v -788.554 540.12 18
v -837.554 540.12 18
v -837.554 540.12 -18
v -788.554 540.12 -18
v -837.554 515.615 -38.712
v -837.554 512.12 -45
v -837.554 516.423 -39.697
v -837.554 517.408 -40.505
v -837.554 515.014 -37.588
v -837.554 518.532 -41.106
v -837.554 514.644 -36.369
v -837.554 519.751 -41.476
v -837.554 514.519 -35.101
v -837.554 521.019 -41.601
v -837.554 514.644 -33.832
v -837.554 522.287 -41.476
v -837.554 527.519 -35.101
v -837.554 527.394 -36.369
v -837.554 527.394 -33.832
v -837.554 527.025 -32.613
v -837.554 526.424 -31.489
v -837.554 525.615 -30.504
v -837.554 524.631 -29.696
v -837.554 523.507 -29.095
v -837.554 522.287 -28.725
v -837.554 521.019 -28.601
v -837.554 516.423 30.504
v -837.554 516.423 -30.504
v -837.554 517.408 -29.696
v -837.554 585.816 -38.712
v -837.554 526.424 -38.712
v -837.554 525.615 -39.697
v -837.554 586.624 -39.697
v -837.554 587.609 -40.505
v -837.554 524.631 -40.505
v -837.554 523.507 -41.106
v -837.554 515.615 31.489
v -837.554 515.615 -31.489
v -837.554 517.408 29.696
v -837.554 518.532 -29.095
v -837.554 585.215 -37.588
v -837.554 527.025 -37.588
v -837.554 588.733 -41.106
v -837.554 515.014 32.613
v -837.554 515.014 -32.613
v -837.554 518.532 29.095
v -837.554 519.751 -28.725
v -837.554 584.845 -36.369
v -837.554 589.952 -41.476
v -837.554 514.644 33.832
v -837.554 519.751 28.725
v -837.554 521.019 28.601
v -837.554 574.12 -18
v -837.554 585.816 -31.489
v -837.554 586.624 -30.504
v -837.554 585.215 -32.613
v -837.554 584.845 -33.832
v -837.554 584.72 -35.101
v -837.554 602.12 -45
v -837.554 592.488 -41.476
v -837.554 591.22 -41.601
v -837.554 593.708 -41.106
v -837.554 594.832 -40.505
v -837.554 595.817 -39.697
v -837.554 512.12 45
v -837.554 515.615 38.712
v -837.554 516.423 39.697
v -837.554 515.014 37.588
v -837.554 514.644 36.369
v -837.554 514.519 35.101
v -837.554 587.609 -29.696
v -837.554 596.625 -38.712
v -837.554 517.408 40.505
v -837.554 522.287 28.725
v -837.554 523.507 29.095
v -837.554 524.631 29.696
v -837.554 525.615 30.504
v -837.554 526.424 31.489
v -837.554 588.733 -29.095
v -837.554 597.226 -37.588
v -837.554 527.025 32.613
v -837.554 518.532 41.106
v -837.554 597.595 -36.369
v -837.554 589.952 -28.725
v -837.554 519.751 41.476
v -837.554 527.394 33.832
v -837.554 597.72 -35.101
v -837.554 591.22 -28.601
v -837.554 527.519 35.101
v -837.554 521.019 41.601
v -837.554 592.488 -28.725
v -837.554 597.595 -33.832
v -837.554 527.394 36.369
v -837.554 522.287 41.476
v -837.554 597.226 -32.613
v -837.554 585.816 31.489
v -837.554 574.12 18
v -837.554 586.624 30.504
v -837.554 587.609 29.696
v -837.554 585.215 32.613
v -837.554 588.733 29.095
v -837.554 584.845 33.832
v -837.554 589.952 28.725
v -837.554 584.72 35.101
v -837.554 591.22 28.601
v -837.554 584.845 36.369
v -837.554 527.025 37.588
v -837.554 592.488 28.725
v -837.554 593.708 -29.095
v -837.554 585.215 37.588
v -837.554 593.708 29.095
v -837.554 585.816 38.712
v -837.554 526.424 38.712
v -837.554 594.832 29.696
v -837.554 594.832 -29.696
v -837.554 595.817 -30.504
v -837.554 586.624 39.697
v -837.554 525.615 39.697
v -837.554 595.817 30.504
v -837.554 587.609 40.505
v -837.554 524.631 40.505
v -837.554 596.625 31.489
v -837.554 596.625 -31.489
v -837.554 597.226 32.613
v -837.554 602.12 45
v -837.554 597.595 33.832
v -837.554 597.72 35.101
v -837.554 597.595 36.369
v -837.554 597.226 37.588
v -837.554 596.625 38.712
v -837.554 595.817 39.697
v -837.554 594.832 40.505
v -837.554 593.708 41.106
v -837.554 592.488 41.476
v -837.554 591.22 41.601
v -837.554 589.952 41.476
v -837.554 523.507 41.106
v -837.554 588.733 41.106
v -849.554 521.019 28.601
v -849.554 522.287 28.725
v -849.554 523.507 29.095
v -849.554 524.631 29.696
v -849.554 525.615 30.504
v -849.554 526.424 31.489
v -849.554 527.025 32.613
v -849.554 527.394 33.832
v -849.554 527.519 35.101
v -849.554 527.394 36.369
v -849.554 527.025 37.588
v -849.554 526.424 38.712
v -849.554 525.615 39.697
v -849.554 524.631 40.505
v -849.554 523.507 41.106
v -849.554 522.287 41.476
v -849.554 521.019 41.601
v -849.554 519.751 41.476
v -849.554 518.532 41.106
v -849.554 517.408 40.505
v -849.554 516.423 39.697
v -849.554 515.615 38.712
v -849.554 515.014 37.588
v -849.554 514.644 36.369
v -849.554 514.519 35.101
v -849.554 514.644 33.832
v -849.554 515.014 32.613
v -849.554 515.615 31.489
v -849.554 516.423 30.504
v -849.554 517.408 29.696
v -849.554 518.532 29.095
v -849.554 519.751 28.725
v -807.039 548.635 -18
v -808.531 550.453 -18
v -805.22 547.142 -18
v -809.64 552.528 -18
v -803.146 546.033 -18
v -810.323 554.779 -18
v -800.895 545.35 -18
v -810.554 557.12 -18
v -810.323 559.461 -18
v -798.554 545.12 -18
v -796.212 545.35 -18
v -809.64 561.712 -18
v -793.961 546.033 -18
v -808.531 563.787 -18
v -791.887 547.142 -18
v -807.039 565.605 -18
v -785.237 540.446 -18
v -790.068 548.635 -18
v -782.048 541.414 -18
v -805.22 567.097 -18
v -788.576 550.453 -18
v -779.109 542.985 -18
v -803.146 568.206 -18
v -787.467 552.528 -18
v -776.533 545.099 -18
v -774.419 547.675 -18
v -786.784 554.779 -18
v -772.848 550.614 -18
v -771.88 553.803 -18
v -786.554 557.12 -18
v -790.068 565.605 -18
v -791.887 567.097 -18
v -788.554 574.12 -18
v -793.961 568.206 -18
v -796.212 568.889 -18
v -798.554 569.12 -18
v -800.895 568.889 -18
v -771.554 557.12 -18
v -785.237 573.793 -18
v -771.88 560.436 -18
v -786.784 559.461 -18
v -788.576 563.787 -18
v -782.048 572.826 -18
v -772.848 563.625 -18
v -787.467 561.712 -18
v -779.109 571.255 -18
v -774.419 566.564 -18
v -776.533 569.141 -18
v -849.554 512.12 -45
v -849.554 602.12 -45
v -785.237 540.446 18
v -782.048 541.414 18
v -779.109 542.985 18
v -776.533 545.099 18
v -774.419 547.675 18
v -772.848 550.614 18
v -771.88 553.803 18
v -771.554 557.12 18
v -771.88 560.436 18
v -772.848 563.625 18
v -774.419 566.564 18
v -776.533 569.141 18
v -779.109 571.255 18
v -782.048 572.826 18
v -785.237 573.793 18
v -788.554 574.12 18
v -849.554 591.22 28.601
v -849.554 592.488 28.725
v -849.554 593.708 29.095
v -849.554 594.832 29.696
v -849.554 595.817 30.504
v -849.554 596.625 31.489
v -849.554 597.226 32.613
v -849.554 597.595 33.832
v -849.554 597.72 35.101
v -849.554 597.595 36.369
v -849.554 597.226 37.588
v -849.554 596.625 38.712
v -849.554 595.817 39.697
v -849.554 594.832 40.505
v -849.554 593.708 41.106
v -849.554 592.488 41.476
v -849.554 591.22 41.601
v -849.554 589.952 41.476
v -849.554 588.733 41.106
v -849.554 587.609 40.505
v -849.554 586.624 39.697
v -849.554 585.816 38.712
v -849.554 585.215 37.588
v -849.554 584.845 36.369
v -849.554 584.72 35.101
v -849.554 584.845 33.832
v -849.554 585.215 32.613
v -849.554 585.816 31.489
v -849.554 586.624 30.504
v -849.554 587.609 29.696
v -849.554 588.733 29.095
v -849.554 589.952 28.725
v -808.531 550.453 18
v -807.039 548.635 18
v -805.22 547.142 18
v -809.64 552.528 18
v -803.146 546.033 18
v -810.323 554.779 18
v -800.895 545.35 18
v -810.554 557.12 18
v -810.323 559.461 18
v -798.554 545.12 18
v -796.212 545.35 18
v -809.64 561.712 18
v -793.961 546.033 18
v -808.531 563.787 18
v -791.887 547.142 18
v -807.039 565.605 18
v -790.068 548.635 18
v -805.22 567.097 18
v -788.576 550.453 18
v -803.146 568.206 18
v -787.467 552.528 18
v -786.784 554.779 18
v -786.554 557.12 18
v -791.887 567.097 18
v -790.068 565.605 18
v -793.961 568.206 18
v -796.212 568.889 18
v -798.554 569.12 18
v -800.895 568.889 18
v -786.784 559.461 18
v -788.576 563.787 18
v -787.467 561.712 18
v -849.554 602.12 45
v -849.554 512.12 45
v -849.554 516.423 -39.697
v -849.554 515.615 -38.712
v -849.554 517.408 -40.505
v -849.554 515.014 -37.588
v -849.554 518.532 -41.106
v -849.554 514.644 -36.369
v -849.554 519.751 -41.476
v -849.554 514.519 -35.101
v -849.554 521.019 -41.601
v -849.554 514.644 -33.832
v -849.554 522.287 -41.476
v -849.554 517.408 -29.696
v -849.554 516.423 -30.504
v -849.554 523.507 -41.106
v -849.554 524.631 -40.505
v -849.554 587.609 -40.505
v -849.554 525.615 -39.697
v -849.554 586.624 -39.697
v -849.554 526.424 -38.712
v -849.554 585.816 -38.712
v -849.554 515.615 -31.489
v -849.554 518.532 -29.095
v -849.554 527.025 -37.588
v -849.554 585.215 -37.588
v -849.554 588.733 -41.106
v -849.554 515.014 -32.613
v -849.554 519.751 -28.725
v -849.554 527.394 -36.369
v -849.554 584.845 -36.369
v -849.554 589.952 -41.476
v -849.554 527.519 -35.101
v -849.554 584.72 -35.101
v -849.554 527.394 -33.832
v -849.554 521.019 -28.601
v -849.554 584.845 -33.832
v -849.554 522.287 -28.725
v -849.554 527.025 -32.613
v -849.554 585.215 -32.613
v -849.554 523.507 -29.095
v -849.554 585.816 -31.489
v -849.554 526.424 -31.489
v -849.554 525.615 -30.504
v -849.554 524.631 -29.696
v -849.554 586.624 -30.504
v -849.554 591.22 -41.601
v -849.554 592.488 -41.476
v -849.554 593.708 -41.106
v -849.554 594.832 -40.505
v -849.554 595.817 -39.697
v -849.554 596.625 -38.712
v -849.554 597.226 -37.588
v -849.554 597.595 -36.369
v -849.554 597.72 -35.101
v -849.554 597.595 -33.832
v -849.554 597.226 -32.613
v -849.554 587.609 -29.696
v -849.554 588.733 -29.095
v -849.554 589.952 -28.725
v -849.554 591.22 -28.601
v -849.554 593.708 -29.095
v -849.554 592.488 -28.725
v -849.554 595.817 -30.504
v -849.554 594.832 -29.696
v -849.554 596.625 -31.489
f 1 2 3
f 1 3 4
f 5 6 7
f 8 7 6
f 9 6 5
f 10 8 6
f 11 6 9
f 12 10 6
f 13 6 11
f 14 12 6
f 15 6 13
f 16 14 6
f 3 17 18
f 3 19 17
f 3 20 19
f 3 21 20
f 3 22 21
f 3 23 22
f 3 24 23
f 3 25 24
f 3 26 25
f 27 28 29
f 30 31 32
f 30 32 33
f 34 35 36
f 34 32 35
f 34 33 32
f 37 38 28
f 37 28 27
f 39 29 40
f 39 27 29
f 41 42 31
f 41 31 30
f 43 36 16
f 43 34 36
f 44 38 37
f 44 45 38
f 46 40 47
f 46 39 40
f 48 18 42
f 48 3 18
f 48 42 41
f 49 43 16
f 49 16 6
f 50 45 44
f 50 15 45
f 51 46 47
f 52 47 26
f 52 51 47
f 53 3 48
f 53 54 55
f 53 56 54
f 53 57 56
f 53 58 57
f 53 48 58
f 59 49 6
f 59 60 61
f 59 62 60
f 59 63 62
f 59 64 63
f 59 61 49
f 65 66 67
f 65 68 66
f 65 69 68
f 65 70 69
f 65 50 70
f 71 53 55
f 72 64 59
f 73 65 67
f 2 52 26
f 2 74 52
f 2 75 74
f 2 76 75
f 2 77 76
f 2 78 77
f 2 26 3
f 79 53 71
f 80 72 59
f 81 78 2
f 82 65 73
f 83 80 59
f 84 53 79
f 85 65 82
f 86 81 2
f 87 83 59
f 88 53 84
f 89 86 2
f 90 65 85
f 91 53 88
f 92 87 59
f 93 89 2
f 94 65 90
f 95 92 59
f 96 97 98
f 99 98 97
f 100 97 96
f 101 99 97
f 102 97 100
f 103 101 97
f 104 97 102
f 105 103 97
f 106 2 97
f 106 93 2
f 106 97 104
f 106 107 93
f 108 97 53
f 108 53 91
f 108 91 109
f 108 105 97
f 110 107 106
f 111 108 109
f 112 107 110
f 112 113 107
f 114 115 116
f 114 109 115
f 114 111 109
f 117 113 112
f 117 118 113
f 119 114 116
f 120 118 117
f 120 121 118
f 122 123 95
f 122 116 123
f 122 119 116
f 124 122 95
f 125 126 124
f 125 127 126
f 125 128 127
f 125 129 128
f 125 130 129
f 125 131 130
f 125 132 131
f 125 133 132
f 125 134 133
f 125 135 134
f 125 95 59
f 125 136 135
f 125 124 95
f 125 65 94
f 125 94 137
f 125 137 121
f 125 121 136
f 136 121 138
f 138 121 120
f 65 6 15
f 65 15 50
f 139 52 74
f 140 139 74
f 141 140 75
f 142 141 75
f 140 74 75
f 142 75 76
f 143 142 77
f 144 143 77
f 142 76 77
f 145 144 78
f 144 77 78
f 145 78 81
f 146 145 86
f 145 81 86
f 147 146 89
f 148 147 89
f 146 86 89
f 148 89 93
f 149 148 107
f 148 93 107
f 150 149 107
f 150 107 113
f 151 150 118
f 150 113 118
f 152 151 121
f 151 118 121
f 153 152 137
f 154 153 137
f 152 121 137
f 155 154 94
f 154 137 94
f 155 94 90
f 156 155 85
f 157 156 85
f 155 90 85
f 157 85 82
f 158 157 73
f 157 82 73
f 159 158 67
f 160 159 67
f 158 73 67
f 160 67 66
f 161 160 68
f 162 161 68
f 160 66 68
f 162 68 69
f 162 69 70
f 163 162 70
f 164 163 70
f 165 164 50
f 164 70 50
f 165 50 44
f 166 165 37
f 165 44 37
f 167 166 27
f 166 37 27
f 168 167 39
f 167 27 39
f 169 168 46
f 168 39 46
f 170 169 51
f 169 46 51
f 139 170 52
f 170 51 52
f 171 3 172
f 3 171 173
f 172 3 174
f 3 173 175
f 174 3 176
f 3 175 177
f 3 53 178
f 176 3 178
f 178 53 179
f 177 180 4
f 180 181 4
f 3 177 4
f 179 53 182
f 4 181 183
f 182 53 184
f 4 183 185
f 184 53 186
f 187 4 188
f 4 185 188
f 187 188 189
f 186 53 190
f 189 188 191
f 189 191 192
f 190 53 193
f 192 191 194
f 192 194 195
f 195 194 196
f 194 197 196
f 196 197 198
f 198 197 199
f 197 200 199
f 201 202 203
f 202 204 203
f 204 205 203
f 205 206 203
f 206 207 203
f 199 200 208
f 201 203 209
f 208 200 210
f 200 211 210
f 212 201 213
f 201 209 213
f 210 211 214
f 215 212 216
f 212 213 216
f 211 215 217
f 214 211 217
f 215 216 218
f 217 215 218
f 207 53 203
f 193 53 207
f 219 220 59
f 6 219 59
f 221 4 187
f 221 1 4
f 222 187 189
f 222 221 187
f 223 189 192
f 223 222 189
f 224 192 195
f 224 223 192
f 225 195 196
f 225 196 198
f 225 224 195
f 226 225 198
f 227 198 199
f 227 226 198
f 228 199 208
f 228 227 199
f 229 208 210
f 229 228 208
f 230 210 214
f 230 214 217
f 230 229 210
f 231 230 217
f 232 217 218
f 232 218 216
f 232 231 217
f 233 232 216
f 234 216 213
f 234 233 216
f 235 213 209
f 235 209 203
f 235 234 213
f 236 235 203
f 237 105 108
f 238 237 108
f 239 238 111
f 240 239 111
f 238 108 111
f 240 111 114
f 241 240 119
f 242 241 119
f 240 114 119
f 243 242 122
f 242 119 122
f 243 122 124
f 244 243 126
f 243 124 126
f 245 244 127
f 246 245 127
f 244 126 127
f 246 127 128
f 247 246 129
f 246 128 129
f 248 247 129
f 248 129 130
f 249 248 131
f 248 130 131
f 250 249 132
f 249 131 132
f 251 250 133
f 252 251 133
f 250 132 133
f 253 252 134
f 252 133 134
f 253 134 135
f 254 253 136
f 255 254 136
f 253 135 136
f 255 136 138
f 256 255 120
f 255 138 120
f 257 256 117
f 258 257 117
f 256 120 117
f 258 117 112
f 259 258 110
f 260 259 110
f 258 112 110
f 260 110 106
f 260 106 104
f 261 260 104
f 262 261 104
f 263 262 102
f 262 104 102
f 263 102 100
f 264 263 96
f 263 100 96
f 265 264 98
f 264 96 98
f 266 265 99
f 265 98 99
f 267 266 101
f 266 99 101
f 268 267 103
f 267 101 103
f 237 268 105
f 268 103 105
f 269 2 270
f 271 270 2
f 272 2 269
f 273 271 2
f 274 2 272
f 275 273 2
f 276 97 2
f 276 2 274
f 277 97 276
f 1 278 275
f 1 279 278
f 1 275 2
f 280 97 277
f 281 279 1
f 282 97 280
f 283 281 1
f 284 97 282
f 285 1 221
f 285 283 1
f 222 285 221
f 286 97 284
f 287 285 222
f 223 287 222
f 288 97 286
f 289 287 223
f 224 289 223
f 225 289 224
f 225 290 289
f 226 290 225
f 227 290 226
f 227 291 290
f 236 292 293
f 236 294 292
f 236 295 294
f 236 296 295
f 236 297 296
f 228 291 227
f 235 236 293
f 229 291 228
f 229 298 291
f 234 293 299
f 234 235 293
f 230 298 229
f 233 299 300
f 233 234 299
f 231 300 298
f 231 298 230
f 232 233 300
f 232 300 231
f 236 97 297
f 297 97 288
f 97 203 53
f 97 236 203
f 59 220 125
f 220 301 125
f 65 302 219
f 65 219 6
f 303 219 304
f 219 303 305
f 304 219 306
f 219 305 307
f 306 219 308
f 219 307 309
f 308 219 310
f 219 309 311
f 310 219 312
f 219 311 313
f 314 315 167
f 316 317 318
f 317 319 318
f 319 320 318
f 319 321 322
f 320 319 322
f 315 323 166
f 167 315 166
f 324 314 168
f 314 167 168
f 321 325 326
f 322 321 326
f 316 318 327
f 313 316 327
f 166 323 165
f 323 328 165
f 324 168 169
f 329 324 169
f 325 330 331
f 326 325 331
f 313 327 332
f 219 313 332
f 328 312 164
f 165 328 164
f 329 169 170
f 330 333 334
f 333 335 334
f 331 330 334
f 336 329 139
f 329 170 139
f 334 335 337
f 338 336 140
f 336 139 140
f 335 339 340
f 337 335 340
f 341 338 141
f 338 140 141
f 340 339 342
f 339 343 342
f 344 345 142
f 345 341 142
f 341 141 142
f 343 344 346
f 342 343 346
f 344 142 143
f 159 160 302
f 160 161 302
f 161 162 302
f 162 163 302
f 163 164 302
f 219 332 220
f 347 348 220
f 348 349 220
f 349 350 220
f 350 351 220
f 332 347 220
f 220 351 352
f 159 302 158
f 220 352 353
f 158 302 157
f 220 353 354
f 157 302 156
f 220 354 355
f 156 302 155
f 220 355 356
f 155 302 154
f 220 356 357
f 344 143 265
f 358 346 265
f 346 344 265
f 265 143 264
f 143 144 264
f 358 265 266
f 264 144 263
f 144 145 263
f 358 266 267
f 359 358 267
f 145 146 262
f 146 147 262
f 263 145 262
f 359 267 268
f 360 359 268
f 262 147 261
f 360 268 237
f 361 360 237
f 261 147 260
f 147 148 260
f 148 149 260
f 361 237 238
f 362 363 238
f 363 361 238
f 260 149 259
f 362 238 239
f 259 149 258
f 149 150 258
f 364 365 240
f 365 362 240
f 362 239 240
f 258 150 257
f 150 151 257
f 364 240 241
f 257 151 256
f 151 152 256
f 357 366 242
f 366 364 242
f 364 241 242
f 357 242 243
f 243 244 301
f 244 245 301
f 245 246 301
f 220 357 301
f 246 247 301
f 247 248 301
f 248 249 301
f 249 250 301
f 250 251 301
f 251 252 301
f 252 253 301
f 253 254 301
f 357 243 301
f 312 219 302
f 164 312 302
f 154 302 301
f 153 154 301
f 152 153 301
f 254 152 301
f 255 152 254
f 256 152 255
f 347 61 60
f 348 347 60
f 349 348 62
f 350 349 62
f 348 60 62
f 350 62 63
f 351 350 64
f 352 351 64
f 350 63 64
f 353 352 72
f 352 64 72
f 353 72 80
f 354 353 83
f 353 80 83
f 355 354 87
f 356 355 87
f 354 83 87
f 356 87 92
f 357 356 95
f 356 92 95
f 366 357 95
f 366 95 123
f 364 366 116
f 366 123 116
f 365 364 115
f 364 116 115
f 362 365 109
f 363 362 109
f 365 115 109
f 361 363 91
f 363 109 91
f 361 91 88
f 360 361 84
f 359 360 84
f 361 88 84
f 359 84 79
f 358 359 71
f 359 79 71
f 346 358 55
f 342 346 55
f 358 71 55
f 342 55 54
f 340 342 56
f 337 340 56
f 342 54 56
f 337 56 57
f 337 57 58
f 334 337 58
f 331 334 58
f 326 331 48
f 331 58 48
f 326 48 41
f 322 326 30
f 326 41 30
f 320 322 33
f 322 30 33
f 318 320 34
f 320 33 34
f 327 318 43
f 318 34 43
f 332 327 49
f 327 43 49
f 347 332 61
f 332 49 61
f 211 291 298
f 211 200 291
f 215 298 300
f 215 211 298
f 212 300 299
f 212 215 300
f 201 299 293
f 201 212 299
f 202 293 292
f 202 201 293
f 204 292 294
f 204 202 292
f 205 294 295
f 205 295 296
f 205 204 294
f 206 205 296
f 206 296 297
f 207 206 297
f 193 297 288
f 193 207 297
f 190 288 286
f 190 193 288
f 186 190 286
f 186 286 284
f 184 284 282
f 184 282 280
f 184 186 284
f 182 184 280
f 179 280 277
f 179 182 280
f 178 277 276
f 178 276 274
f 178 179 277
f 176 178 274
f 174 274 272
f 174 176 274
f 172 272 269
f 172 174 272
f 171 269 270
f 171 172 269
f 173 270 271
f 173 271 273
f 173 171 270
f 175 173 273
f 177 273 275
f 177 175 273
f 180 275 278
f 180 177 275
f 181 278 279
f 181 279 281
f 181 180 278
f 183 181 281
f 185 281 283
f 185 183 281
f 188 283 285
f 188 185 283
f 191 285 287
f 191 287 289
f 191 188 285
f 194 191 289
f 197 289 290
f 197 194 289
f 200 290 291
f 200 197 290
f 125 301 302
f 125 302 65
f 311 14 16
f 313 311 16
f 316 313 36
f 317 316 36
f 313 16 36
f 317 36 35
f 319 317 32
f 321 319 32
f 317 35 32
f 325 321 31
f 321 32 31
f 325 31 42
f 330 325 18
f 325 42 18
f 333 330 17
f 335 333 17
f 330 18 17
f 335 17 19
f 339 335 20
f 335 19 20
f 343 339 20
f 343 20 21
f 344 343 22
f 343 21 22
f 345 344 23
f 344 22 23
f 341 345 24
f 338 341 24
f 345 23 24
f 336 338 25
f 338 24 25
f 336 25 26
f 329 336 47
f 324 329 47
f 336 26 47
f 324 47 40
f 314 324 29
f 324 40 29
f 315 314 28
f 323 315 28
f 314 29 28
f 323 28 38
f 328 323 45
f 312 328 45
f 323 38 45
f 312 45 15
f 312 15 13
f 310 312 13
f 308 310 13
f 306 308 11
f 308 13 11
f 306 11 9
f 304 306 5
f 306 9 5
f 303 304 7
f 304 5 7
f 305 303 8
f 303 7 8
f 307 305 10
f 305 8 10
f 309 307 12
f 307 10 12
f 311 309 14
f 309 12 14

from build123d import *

# Parameters (mm, degrees)
DODANIE_WYCI_GNI_CIE3_DEPTH      = 18
DODANIE_WYCI_GNI_CIE3_DEPTH_BACK = 18
SZKIC1_R                         = 12
DODANIE_WYCI_GNI_CIE4_DEPTH      = 45
DODANIE_WYCI_GNI_CIE4_DEPTH_BACK = 45
SKETCH5_R                        = 6.5
CUT_EXTRUDE1_DEPTH               = 12


with BuildPart() as part:
    # Szkic1 → Dodanie-wyci_gni_cie3 (new, two sides: drawn at the far end of the back side and taken through both)
    with BuildSketch(Plane.XY.offset(-DODANIE_WYCI_GNI_CIE3_DEPTH_BACK)):
        with BuildLine():
            Line((-788.553538537, 574.11980128), (-837.553538537, 574.11980128))
            Line((-837.553538537, 574.11980128), (-837.553538537, 540.11980128))
            Line((-837.553538537, 540.11980128), (-788.553538537, 540.11980128))
            ThreePointArc((-788.553538537, 540.11980128), (-771.553538537, 557.11980128), (-788.553538537, 574.11980128))
        make_face()
        with Locations((-798.553538537, 557.11980128)):
            Circle(SZKIC1_R, mode=Mode.SUBTRACT)
    extrude(amount=DODANIE_WYCI_GNI_CIE3_DEPTH + DODANIE_WYCI_GNI_CIE3_DEPTH_BACK)

    # Szkic1_6 → Dodanie-wyci_gni_cie4 (add, two sides: drawn at the far end of the back side and taken through both)
    with BuildSketch(Plane.XY.offset(-DODANIE_WYCI_GNI_CIE4_DEPTH_BACK)):
        Polygon((-837.553538537, 602.11980128), (-849.553538537, 602.11980128), (-849.553538537, 512.11980128), (-837.553538537, 512.11980128), (-837.553538537, 540.11980128), (-837.553538537, 574.11980128), align=None)
    extrude(amount=DODANIE_WYCI_GNI_CIE4_DEPTH + DODANIE_WYCI_GNI_CIE4_DEPTH_BACK)

    # Sketch5 → Cut-Extrude1 (cut)
    with BuildSketch(Plane(origin=(-837.553538537, 0, 0), x_dir=(0, 0, -1), z_dir=(1, 0, 0))):
        with Locations((-35.100505063, 591.220306343)):
            Circle(SKETCH5_R)
        with Locations((35.100505063, 591.220306343)):
            Circle(SKETCH5_R)
        with Locations((35.100505063, 521.019296217)):
            Circle(SKETCH5_R)
        with Locations((-35.100505063, 521.019296217)):
            Circle(SKETCH5_R)
    extrude(amount=-CUT_EXTRUDE1_DEPTH, mode=Mode.SUBTRACT)


solid = part.part
